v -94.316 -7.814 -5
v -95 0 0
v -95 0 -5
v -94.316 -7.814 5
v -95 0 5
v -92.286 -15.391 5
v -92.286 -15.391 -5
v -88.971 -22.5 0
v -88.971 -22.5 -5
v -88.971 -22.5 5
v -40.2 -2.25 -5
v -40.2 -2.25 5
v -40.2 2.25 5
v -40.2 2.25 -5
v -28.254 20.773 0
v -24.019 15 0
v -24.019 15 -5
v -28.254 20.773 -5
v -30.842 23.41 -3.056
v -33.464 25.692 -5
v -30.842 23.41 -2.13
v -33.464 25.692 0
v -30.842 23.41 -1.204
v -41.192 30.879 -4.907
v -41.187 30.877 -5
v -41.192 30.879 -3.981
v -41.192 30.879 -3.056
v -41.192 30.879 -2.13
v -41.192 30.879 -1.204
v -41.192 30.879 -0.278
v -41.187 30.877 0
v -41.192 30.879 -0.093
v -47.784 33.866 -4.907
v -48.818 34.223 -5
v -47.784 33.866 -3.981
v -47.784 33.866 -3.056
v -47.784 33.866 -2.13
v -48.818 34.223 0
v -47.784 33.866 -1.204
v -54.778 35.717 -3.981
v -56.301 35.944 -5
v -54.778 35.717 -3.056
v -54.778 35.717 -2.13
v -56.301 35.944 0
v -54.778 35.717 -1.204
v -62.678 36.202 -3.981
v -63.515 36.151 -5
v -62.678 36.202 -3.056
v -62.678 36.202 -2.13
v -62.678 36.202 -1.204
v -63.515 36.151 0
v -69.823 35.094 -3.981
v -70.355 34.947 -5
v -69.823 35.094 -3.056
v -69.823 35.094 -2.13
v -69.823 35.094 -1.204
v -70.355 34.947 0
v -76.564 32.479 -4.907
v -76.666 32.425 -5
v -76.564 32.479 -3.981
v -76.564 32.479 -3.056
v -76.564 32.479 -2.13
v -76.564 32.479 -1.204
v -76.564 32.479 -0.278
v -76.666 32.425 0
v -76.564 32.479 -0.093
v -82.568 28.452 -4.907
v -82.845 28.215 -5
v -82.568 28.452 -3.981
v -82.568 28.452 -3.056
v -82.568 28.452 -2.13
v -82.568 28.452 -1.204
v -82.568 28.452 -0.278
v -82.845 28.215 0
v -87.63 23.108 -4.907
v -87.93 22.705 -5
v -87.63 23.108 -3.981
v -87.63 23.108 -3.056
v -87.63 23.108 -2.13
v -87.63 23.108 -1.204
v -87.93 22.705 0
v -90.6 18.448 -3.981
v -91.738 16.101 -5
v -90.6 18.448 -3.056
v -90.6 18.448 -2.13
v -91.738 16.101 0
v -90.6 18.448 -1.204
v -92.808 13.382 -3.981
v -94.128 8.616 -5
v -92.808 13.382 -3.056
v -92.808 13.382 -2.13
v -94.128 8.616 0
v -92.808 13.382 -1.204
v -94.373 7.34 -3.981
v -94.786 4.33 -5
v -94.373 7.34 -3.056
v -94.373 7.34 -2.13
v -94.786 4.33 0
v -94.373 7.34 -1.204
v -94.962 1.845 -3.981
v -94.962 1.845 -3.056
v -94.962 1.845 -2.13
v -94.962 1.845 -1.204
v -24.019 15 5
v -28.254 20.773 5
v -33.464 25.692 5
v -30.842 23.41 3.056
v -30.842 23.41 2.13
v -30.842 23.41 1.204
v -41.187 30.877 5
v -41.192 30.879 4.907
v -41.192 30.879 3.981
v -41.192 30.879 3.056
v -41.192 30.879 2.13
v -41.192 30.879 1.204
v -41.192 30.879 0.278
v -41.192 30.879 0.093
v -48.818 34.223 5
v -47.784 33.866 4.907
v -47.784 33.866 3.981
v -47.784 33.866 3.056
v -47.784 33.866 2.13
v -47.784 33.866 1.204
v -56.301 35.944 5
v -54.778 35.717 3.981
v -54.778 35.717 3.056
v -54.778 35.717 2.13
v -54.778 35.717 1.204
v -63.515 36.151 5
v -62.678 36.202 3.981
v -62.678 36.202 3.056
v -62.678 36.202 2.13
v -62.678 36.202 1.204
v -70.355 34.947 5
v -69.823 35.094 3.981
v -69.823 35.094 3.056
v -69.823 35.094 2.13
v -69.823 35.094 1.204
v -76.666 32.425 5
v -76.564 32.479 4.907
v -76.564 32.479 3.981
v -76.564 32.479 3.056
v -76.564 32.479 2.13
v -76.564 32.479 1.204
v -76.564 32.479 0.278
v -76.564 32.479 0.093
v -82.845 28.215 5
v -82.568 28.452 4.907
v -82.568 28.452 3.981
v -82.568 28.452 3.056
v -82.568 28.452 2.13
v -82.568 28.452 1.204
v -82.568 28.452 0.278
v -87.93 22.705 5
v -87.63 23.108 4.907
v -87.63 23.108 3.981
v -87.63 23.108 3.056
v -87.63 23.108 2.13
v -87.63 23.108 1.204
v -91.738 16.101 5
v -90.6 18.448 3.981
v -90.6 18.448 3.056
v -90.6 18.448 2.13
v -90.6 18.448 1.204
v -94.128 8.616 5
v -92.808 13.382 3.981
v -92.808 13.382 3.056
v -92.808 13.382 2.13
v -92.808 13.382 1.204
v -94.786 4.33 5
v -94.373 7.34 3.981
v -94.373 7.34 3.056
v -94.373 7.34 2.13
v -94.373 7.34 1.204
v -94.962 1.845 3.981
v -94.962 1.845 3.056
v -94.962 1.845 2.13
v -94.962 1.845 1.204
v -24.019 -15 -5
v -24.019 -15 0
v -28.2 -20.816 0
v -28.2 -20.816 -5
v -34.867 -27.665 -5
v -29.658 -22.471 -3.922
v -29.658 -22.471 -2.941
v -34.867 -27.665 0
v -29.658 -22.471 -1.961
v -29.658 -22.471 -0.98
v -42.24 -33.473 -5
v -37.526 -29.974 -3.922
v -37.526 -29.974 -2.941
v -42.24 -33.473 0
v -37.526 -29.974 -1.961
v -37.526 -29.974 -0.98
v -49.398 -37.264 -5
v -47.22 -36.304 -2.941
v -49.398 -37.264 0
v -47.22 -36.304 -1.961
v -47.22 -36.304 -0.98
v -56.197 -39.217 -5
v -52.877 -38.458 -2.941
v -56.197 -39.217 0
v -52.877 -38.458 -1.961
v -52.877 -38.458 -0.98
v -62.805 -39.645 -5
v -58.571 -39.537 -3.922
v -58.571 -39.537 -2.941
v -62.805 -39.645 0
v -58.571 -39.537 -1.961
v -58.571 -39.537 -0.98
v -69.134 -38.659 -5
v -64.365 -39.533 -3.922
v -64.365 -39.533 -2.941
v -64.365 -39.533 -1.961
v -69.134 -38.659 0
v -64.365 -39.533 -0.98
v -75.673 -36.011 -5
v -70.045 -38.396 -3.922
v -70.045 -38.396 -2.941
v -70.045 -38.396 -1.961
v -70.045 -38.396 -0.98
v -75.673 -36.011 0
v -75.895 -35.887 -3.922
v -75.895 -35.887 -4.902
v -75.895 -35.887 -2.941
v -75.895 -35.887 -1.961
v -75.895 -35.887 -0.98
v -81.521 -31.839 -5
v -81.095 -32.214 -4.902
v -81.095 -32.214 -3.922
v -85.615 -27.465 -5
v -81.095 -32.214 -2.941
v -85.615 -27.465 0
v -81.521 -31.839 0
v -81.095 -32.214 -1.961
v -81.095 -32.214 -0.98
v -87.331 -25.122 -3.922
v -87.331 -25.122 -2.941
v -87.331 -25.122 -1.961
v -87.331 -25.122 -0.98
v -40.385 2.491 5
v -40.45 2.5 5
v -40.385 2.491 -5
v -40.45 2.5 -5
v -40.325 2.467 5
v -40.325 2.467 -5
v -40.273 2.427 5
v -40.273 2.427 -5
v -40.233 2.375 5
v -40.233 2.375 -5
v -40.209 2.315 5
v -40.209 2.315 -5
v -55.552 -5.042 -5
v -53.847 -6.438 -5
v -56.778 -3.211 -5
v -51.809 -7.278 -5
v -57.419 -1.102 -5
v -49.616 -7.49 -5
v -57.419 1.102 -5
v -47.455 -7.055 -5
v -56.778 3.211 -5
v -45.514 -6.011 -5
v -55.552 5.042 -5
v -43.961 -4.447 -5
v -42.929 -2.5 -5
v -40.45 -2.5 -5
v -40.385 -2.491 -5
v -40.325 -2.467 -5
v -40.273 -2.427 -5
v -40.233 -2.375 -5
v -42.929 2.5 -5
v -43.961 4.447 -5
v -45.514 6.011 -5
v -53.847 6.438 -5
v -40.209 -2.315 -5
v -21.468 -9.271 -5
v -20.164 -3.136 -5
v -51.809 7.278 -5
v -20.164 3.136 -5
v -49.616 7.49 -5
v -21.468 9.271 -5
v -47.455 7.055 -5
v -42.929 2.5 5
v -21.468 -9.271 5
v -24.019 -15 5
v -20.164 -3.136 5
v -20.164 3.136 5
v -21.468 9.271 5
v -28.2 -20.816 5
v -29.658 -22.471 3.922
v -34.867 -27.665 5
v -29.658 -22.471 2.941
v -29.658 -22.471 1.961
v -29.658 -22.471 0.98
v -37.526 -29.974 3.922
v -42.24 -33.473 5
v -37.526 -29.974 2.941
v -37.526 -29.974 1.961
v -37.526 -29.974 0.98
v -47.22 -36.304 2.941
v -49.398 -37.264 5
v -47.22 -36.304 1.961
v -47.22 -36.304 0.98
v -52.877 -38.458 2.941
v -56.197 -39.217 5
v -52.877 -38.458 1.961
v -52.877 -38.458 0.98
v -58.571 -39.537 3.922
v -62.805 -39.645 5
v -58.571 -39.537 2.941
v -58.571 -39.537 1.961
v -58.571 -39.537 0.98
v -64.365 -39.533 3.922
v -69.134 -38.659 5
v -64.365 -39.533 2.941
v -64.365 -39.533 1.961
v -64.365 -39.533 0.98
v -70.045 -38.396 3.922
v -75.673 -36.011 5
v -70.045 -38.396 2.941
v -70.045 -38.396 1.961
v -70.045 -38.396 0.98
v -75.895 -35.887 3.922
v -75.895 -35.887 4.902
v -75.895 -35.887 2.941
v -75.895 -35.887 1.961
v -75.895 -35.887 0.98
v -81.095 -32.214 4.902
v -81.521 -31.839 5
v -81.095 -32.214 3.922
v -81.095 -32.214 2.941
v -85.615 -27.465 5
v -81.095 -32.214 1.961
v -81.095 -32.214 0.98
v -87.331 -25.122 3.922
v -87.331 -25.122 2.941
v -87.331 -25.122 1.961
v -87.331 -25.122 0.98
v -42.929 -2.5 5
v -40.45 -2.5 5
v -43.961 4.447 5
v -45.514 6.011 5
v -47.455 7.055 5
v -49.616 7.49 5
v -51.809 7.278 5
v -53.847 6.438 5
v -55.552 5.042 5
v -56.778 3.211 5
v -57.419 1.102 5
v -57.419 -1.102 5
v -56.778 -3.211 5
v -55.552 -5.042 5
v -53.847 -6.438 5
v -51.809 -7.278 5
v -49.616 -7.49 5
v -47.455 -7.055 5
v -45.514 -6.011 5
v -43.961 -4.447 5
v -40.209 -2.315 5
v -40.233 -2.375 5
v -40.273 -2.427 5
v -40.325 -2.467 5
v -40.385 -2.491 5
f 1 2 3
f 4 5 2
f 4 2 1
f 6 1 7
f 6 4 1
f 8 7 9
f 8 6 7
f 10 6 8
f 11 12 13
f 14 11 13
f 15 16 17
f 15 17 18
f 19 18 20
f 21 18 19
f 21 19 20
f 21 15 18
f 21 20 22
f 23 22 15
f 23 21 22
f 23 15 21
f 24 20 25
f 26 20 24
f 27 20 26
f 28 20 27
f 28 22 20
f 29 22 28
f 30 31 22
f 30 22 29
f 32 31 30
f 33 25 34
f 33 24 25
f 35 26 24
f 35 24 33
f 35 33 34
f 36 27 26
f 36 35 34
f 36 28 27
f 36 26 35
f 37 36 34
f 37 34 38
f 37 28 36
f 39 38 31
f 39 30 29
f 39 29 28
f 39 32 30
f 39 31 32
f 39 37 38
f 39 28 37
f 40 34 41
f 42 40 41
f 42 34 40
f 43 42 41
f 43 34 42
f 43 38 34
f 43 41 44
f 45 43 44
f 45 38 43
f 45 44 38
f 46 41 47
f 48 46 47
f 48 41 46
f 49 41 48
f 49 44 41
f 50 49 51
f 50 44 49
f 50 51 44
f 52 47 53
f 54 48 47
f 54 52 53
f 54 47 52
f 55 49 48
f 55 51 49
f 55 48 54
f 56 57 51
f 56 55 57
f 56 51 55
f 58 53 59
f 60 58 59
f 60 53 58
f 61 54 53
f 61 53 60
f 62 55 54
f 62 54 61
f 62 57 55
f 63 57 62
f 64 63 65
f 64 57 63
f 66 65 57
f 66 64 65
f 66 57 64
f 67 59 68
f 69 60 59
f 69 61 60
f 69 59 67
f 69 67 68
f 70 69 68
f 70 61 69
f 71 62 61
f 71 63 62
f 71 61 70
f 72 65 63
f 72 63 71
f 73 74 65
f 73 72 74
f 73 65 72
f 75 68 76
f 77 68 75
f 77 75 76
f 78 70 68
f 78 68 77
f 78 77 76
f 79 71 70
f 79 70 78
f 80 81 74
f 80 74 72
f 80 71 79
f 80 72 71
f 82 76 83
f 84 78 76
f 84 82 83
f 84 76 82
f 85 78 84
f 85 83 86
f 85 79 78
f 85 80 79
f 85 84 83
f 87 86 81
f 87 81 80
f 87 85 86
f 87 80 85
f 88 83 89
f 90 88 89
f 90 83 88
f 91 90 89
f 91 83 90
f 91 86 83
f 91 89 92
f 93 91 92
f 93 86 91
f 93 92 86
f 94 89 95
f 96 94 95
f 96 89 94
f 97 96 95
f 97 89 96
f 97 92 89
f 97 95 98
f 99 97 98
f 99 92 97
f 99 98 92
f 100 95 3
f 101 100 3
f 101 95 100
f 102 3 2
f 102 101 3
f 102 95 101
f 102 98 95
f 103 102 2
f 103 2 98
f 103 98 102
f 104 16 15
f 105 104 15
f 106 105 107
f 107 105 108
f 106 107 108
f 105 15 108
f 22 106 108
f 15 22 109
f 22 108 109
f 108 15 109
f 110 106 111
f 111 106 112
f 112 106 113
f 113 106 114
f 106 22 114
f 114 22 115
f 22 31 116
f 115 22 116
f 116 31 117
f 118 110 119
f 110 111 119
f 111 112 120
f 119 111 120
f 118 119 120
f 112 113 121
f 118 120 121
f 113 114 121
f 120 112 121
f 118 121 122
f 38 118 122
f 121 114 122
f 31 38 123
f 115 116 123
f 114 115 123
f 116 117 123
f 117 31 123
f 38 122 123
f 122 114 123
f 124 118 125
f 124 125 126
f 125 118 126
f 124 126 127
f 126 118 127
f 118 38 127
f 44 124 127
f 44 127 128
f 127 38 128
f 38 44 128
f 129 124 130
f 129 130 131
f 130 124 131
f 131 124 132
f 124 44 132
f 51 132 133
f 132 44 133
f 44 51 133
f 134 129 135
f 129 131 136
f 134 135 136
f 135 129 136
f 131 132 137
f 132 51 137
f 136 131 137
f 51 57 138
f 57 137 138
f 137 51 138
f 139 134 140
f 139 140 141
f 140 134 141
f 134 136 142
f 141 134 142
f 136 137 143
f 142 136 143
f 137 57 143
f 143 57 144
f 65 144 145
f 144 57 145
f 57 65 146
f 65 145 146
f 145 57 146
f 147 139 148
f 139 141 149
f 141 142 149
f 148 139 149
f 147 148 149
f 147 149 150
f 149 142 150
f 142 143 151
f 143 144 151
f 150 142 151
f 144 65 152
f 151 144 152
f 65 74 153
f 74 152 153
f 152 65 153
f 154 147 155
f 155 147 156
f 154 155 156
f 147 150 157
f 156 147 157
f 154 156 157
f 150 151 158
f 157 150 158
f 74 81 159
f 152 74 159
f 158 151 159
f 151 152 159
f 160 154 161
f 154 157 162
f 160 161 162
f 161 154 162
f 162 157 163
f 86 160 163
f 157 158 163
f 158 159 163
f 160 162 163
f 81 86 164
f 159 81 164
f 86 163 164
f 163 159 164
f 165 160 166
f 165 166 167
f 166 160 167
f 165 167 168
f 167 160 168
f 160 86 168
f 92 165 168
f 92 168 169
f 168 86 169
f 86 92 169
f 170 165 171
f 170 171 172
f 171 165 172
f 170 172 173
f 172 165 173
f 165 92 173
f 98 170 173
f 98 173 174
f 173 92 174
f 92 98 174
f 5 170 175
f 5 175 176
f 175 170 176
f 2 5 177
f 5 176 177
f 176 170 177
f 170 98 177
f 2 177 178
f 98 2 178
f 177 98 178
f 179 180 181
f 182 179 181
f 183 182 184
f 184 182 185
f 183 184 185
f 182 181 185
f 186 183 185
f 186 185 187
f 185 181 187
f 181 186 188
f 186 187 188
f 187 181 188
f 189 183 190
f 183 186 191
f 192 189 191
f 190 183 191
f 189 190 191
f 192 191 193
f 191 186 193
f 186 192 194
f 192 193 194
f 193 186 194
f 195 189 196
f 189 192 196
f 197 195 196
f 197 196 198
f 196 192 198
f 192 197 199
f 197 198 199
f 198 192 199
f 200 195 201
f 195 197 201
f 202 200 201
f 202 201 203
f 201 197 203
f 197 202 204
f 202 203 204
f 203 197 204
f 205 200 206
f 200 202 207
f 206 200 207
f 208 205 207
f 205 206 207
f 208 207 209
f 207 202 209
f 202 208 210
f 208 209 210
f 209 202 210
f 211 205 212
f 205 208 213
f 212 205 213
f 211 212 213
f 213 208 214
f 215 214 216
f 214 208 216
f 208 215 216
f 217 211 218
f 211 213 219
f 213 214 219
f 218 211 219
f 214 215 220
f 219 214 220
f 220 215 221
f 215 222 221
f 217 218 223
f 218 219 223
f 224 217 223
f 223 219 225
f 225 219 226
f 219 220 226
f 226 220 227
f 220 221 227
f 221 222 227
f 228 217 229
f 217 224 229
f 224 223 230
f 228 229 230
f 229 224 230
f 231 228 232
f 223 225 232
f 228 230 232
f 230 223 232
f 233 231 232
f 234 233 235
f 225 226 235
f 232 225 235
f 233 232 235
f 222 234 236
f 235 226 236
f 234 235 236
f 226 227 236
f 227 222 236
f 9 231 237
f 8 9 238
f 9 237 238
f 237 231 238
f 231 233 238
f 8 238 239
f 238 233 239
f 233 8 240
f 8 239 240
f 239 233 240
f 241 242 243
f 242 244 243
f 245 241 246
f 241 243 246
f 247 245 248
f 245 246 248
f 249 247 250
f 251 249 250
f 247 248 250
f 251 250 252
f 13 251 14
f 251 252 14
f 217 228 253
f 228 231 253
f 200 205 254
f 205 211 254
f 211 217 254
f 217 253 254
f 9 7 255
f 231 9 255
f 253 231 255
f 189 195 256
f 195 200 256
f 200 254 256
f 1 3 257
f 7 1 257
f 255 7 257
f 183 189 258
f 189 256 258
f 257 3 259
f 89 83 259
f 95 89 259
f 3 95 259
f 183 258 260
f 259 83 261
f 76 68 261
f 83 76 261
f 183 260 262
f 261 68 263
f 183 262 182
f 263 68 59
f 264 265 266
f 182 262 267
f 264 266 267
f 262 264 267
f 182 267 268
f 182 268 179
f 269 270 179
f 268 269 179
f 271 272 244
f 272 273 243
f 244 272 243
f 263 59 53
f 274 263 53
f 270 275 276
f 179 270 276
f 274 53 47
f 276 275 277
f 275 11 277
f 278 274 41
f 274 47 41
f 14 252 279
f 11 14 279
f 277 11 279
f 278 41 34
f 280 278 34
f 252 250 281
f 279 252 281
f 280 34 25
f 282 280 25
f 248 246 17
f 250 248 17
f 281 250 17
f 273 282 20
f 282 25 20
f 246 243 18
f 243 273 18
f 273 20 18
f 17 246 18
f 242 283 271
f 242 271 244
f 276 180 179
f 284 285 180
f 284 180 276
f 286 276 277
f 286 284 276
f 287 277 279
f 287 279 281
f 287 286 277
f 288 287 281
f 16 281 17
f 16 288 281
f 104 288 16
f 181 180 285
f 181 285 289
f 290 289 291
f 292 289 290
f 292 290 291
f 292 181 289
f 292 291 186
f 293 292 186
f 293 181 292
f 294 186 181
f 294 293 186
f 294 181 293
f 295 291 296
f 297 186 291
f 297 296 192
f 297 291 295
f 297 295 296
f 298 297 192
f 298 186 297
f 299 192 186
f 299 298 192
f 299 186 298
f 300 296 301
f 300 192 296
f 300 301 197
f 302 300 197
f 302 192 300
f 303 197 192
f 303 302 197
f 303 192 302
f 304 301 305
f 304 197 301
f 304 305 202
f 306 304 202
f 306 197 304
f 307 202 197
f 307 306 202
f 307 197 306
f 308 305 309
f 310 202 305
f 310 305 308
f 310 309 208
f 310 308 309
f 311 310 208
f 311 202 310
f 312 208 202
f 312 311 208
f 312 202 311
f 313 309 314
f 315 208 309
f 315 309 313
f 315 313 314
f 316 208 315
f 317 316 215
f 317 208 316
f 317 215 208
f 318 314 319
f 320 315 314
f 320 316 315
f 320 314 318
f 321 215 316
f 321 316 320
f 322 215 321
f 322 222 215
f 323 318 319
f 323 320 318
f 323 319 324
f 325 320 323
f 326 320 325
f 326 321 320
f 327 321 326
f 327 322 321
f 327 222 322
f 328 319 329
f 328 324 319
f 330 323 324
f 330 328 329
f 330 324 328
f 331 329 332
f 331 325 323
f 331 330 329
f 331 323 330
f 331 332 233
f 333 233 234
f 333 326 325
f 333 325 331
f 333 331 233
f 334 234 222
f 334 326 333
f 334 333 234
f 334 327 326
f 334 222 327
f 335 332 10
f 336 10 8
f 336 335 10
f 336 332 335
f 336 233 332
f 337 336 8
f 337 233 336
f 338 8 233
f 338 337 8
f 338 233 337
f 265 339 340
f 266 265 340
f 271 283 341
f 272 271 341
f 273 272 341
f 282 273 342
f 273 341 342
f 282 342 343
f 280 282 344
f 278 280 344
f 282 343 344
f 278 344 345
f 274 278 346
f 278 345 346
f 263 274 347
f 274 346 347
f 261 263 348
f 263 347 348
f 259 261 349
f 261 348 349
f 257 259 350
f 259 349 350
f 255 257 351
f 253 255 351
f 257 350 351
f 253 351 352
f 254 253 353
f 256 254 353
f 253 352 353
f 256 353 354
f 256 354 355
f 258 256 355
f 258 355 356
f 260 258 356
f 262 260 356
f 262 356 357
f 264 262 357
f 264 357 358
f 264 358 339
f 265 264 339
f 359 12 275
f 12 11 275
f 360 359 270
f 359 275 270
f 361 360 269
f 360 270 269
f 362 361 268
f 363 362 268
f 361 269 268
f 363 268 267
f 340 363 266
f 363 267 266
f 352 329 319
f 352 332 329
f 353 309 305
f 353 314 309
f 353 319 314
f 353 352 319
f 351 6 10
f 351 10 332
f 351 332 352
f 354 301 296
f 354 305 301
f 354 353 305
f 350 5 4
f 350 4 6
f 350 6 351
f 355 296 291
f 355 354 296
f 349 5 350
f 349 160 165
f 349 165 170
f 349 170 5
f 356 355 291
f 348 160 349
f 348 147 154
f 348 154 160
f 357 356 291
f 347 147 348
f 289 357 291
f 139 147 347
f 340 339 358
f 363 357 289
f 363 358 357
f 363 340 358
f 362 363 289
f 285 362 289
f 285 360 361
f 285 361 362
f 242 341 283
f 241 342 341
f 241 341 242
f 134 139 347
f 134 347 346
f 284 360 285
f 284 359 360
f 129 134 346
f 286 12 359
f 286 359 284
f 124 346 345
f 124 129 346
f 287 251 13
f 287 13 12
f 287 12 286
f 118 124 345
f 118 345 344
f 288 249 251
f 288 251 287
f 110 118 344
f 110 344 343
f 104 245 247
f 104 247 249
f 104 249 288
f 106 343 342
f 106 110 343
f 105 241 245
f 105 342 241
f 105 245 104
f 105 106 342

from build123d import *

# Parameters (mm, degrees)
BOSS_EXTRUDE1_DEPTH            = 5
CUT_EXTRUDE2_REACH             = 105.073
SKETCH2_R                      = 7.5
CUT_EXTRUDE2_DIRECTION_2_REACH = 105.073
CUT_EXTRUDE3_REACH             = 105.073
SKETCH3_W                      = 2.728932188
SKETCH3_H                      = 5
CUT_EXTRUDE3_DIRECTION_2_REACH = 105.073
FILLET1_R                      = 0.25


with BuildPart() as part:
    # Cam Profile Sketch → Boss-Extrude1 (new, symmetric)
    with BuildSketch(Plane.XY):
        with BuildLine():
            ThreePointArc((-95, 0), (-93.466662183, -11.64685703), (-88.97114317, -22.5))
            add(Edge.make_bspline(
                [(-24.019237886, -15), (-24.057726996, -15.066665093), (-24.135542603, -15.199984179), (-24.294210245, -15.468284804), (-24.486367794, -15.783992161), (-24.675050968, -16.085484944), (-24.8709034, -16.391428035), (-25.070085707, -16.695400658), (-25.371964938, -17.145687962), (-25.732401665, -17.664420975), (-26.25998012, -18.393991283), (-26.860454757, -19.180499871), (-27.42063933, -19.883348998), (-28.224273383, -20.853609638), (-28.932471155, -21.671343711), (-29.778521208, -22.611364699), (-30.768740875, -23.66727202), (-31.65162684, -24.579405423), (-32.935753353, -25.859926354), (-34.511627336, -27.360899541), (-36.401054833, -29.057445052), (-38.638036886, -30.906683495), (-40.962685031, -32.645088961), (-43.383053705, -34.248371754), (-45.959016936, -35.723391452), (-48.63808706, -37.003330144), (-51.412600635, -38.062115797), (-54.268660613, -38.876057715), (-57.122562395, -39.420836577), (-60.014975318, -39.698800922), (-62.92095712, -39.698748169), (-65.813153516, -39.414329857), (-68.733508438, -38.830455347), (-71.647577447, -37.928108287), (-74.516760762, -36.695099337), (-77.300501066, -35.127967674), (-79.581058345, -33.512324426), (-81.413170087, -31.971920034), (-82.710461133, -30.732394546), (-83.542718688, -29.87350859), (-84.214382827, -29.137329667), (-84.738529492, -28.536655846), (-85.245699359, -27.929262329), (-85.736176294, -27.316005605), (-86.328070579, -26.54398124), (-86.895689897, -25.761539987), (-87.388541821, -25.043964898), (-87.812126944, -24.397637278), (-88.0727685, -23.98897293), (-88.277415015, -23.661731501), (-88.47549914, -23.338928267), (-88.682364544, -22.994067163), (-88.846740598, -22.714364006), (-88.930106702, -22.571077248), (-88.97114317, -22.5)],
                knots=[0.066100625, 0.066100625, 0.066100625, 0.066100625, 0.066100625, 0.069918368, 0.07373611, 0.077553853, 0.081371596, 0.085189338, 0.089007081, 0.092824823, 0.104210915, 0.111779263, 0.126915961, 0.13448431, 0.142052658, 0.164824841, 0.172460326, 0.187731296, 0.203002265, 0.218273235, 0.248815158, 0.279357081, 0.309899022, 0.340440963, 0.3709829, 0.401524836, 0.434787958, 0.465329966, 0.495871896, 0.526413881, 0.556955827, 0.587497796, 0.618039752, 0.648581738, 0.682146995, 0.715712289, 0.749277564, 0.782842858, 0.799625499, 0.816408139, 0.82479946, 0.833190781, 0.841582102, 0.849973423, 0.858114254, 0.866255085, 0.882536748, 0.890677579, 0.894747995, 0.89881841, 0.902888826, 0.906959242, 0.911029657, 0.915100073, 0.915100073, 0.915100073, 0.915100073, 0.915100073], degree=4))
            ThreePointArc((-24.019237886, -15), (-20, 0), (-24.019237887, 15))
            add(Edge.make_bspline(
                [(-24.019237887, 15), (-24.068311179, 15.084997436), (-24.167781709, 15.254906705), (-24.372716614, 15.599220619), (-24.61865228, 15.997095978), (-24.863655112, 16.379697363), (-25.119128687, 16.767025959), (-25.379779341, 17.150163728), (-25.645266211, 17.528771772), (-25.945604472, 17.944852126), (-26.282522616, 18.396747851), (-26.657891266, 18.882728432), (-27.073733427, 19.401098012), (-27.605052795, 20.039628028), (-28.260315658, 20.790892876), (-29.137432462, 21.741660802), (-30.256936541, 22.871106034), (-31.513445882, 24.046837605), (-32.913450459, 25.258032474), (-34.702854921, 26.693691652), (-36.916722417, 28.304317086), (-39.592318083, 30.026272793), (-42.770642978, 31.770153659), (-46.070459158, 33.272672468), (-49.480743686, 34.50579862), (-53.151070656, 35.484877681), (-56.901056915, 36.10189034), (-60.695503134, 36.328853465), (-64.491489782, 36.145677899), (-68.078081084, 35.592442903), (-71.584996355, 34.657928649), (-74.969324852, 33.346617401), (-78.188701421, 31.670427503), (-81.216628819, 29.639247685), (-84.012954659, 27.273762593), (-86.22395529, 24.936788464), (-88.220215395, 22.396629412), (-89.728420053, 20.074270167), (-90.845118378, 18.05504037), (-91.819116647, 15.964820644), (-92.485619066, 14.320524673), (-92.985254722, 12.89744926), (-93.352941131, 11.710925817), (-93.616328574, 10.770894801), (-93.811723307, 10.014627811), (-94.03690859, 9.064875481), (-94.244035537, 8.074310703), (-94.430306675, 7.044765066), (-94.592927417, 5.974011134), (-94.710991165, 5.06120396), (-94.808756512, 4.141198889), (-94.886451771, 3.228074895), (-94.944318966, 2.297668795), (-94.977825799, 1.506610134), (-94.994478369, 0.807430389), (-94.999212886, 0.295654949), (-95, 0.0977871), (-95, 0)],
                knots=[0.066673701, 0.066673701, 0.066673701, 0.066673701, 0.066673701, 0.070604246, 0.074534791, 0.078465336, 0.082395881, 0.086326425, 0.09025697, 0.094187515, 0.09811806, 0.103762991, 0.109407922, 0.115052853, 0.120697784, 0.131987646, 0.143277509, 0.158999688, 0.174721868, 0.190444047, 0.206166227, 0.236936319, 0.267706411, 0.298476509, 0.329246606, 0.360016733, 0.390786859, 0.427383219, 0.45815328, 0.48892347, 0.519693606, 0.550463754, 0.581233829, 0.612004014, 0.642774165, 0.674103327, 0.705432525, 0.721097132, 0.752426343, 0.768090947, 0.783755547, 0.799420146, 0.81268856, 0.819322767, 0.825956974, 0.832591181, 0.839225388, 0.852493803, 0.860326099, 0.868158396, 0.875990693, 0.883822989, 0.891655286, 0.899487583, 0.90731988, 0.911236028, 0.915152176, 0.915152176, 0.915152176, 0.915152176, 0.915152176], degree=4))
        make_face()
    extrude(amount=BOSS_EXTRUDE1_DEPTH, both=True)

    # Sketch2 → Cut-Extrude2 (cut, up to next)
    with BuildSketch(Plane.XY, mode=Mode.PRIVATE) as cut_extrude2_sk1:
        with Locations((-50, 0)):
            Circle(SKETCH2_R)
    cut_extrude2_tool1 = extrude(cut_extrude2_sk1.sketch, amount=-CUT_EXTRUDE2_REACH, mode=Mode.PRIVATE) & part.part
    add(cut_extrude2_tool1.solids().sort_by_distance((-50, 0, 0))[0], mode=Mode.SUBTRACT)

    # Sketch2 → Cut-Extrude2 direction 2 (cut, up to next)
    with BuildSketch(Plane.XY, mode=Mode.PRIVATE) as cut_extrude2_direction_2_sk1:
        with Locations((-50, 0)):
            Circle(SKETCH2_R)
    cut_extrude2_direction_2_tool1 = extrude(cut_extrude2_direction_2_sk1.sketch, amount=CUT_EXTRUDE2_DIRECTION_2_REACH, mode=Mode.PRIVATE) & part.part
    add(cut_extrude2_direction_2_tool1.solids().sort_by_distance((-50, 0, 0))[0], mode=Mode.SUBTRACT)

    # Sketch3 → Cut-Extrude3 (cut, up to next)
    with BuildSketch(Plane.XY, mode=Mode.PRIVATE) as cut_extrude3_sk1:
        with Locations((-41.564466094, 0)):
            Rectangle(SKETCH3_W, SKETCH3_H)
    cut_extrude3_tool1 = extrude(cut_extrude3_sk1.sketch, amount=-CUT_EXTRUDE3_REACH, mode=Mode.PRIVATE) & part.part
    add(cut_extrude3_tool1.solids().sort_by_distance((-41.564466, 0, 0))[0], mode=Mode.SUBTRACT)

    # Sketch3 → Cut-Extrude3 direction 2 (cut, up to next)
    with BuildSketch(Plane.XY, mode=Mode.PRIVATE) as cut_extrude3_direction_2_sk1:
        with Locations((-41.564466094, 0)):
            Rectangle(SKETCH3_W, SKETCH3_H)
    cut_extrude3_direction_2_tool1 = extrude(cut_extrude3_direction_2_sk1.sketch, amount=CUT_EXTRUDE3_DIRECTION_2_REACH, mode=Mode.PRIVATE) & part.part
    add(cut_extrude3_direction_2_tool1.solids().sort_by_distance((-41.564466, 0, 0))[0], mode=Mode.SUBTRACT)

    # Fillet1
    fillet1_edges = [part.edges().sort_by_distance(p)[0] for p in [
        (-40.2, -2.5, 0),
        (-40.2, 2.5, 0),
    ]]
    fillet(fillet1_edges, radius=FILLET1_R)


solid = part.part
